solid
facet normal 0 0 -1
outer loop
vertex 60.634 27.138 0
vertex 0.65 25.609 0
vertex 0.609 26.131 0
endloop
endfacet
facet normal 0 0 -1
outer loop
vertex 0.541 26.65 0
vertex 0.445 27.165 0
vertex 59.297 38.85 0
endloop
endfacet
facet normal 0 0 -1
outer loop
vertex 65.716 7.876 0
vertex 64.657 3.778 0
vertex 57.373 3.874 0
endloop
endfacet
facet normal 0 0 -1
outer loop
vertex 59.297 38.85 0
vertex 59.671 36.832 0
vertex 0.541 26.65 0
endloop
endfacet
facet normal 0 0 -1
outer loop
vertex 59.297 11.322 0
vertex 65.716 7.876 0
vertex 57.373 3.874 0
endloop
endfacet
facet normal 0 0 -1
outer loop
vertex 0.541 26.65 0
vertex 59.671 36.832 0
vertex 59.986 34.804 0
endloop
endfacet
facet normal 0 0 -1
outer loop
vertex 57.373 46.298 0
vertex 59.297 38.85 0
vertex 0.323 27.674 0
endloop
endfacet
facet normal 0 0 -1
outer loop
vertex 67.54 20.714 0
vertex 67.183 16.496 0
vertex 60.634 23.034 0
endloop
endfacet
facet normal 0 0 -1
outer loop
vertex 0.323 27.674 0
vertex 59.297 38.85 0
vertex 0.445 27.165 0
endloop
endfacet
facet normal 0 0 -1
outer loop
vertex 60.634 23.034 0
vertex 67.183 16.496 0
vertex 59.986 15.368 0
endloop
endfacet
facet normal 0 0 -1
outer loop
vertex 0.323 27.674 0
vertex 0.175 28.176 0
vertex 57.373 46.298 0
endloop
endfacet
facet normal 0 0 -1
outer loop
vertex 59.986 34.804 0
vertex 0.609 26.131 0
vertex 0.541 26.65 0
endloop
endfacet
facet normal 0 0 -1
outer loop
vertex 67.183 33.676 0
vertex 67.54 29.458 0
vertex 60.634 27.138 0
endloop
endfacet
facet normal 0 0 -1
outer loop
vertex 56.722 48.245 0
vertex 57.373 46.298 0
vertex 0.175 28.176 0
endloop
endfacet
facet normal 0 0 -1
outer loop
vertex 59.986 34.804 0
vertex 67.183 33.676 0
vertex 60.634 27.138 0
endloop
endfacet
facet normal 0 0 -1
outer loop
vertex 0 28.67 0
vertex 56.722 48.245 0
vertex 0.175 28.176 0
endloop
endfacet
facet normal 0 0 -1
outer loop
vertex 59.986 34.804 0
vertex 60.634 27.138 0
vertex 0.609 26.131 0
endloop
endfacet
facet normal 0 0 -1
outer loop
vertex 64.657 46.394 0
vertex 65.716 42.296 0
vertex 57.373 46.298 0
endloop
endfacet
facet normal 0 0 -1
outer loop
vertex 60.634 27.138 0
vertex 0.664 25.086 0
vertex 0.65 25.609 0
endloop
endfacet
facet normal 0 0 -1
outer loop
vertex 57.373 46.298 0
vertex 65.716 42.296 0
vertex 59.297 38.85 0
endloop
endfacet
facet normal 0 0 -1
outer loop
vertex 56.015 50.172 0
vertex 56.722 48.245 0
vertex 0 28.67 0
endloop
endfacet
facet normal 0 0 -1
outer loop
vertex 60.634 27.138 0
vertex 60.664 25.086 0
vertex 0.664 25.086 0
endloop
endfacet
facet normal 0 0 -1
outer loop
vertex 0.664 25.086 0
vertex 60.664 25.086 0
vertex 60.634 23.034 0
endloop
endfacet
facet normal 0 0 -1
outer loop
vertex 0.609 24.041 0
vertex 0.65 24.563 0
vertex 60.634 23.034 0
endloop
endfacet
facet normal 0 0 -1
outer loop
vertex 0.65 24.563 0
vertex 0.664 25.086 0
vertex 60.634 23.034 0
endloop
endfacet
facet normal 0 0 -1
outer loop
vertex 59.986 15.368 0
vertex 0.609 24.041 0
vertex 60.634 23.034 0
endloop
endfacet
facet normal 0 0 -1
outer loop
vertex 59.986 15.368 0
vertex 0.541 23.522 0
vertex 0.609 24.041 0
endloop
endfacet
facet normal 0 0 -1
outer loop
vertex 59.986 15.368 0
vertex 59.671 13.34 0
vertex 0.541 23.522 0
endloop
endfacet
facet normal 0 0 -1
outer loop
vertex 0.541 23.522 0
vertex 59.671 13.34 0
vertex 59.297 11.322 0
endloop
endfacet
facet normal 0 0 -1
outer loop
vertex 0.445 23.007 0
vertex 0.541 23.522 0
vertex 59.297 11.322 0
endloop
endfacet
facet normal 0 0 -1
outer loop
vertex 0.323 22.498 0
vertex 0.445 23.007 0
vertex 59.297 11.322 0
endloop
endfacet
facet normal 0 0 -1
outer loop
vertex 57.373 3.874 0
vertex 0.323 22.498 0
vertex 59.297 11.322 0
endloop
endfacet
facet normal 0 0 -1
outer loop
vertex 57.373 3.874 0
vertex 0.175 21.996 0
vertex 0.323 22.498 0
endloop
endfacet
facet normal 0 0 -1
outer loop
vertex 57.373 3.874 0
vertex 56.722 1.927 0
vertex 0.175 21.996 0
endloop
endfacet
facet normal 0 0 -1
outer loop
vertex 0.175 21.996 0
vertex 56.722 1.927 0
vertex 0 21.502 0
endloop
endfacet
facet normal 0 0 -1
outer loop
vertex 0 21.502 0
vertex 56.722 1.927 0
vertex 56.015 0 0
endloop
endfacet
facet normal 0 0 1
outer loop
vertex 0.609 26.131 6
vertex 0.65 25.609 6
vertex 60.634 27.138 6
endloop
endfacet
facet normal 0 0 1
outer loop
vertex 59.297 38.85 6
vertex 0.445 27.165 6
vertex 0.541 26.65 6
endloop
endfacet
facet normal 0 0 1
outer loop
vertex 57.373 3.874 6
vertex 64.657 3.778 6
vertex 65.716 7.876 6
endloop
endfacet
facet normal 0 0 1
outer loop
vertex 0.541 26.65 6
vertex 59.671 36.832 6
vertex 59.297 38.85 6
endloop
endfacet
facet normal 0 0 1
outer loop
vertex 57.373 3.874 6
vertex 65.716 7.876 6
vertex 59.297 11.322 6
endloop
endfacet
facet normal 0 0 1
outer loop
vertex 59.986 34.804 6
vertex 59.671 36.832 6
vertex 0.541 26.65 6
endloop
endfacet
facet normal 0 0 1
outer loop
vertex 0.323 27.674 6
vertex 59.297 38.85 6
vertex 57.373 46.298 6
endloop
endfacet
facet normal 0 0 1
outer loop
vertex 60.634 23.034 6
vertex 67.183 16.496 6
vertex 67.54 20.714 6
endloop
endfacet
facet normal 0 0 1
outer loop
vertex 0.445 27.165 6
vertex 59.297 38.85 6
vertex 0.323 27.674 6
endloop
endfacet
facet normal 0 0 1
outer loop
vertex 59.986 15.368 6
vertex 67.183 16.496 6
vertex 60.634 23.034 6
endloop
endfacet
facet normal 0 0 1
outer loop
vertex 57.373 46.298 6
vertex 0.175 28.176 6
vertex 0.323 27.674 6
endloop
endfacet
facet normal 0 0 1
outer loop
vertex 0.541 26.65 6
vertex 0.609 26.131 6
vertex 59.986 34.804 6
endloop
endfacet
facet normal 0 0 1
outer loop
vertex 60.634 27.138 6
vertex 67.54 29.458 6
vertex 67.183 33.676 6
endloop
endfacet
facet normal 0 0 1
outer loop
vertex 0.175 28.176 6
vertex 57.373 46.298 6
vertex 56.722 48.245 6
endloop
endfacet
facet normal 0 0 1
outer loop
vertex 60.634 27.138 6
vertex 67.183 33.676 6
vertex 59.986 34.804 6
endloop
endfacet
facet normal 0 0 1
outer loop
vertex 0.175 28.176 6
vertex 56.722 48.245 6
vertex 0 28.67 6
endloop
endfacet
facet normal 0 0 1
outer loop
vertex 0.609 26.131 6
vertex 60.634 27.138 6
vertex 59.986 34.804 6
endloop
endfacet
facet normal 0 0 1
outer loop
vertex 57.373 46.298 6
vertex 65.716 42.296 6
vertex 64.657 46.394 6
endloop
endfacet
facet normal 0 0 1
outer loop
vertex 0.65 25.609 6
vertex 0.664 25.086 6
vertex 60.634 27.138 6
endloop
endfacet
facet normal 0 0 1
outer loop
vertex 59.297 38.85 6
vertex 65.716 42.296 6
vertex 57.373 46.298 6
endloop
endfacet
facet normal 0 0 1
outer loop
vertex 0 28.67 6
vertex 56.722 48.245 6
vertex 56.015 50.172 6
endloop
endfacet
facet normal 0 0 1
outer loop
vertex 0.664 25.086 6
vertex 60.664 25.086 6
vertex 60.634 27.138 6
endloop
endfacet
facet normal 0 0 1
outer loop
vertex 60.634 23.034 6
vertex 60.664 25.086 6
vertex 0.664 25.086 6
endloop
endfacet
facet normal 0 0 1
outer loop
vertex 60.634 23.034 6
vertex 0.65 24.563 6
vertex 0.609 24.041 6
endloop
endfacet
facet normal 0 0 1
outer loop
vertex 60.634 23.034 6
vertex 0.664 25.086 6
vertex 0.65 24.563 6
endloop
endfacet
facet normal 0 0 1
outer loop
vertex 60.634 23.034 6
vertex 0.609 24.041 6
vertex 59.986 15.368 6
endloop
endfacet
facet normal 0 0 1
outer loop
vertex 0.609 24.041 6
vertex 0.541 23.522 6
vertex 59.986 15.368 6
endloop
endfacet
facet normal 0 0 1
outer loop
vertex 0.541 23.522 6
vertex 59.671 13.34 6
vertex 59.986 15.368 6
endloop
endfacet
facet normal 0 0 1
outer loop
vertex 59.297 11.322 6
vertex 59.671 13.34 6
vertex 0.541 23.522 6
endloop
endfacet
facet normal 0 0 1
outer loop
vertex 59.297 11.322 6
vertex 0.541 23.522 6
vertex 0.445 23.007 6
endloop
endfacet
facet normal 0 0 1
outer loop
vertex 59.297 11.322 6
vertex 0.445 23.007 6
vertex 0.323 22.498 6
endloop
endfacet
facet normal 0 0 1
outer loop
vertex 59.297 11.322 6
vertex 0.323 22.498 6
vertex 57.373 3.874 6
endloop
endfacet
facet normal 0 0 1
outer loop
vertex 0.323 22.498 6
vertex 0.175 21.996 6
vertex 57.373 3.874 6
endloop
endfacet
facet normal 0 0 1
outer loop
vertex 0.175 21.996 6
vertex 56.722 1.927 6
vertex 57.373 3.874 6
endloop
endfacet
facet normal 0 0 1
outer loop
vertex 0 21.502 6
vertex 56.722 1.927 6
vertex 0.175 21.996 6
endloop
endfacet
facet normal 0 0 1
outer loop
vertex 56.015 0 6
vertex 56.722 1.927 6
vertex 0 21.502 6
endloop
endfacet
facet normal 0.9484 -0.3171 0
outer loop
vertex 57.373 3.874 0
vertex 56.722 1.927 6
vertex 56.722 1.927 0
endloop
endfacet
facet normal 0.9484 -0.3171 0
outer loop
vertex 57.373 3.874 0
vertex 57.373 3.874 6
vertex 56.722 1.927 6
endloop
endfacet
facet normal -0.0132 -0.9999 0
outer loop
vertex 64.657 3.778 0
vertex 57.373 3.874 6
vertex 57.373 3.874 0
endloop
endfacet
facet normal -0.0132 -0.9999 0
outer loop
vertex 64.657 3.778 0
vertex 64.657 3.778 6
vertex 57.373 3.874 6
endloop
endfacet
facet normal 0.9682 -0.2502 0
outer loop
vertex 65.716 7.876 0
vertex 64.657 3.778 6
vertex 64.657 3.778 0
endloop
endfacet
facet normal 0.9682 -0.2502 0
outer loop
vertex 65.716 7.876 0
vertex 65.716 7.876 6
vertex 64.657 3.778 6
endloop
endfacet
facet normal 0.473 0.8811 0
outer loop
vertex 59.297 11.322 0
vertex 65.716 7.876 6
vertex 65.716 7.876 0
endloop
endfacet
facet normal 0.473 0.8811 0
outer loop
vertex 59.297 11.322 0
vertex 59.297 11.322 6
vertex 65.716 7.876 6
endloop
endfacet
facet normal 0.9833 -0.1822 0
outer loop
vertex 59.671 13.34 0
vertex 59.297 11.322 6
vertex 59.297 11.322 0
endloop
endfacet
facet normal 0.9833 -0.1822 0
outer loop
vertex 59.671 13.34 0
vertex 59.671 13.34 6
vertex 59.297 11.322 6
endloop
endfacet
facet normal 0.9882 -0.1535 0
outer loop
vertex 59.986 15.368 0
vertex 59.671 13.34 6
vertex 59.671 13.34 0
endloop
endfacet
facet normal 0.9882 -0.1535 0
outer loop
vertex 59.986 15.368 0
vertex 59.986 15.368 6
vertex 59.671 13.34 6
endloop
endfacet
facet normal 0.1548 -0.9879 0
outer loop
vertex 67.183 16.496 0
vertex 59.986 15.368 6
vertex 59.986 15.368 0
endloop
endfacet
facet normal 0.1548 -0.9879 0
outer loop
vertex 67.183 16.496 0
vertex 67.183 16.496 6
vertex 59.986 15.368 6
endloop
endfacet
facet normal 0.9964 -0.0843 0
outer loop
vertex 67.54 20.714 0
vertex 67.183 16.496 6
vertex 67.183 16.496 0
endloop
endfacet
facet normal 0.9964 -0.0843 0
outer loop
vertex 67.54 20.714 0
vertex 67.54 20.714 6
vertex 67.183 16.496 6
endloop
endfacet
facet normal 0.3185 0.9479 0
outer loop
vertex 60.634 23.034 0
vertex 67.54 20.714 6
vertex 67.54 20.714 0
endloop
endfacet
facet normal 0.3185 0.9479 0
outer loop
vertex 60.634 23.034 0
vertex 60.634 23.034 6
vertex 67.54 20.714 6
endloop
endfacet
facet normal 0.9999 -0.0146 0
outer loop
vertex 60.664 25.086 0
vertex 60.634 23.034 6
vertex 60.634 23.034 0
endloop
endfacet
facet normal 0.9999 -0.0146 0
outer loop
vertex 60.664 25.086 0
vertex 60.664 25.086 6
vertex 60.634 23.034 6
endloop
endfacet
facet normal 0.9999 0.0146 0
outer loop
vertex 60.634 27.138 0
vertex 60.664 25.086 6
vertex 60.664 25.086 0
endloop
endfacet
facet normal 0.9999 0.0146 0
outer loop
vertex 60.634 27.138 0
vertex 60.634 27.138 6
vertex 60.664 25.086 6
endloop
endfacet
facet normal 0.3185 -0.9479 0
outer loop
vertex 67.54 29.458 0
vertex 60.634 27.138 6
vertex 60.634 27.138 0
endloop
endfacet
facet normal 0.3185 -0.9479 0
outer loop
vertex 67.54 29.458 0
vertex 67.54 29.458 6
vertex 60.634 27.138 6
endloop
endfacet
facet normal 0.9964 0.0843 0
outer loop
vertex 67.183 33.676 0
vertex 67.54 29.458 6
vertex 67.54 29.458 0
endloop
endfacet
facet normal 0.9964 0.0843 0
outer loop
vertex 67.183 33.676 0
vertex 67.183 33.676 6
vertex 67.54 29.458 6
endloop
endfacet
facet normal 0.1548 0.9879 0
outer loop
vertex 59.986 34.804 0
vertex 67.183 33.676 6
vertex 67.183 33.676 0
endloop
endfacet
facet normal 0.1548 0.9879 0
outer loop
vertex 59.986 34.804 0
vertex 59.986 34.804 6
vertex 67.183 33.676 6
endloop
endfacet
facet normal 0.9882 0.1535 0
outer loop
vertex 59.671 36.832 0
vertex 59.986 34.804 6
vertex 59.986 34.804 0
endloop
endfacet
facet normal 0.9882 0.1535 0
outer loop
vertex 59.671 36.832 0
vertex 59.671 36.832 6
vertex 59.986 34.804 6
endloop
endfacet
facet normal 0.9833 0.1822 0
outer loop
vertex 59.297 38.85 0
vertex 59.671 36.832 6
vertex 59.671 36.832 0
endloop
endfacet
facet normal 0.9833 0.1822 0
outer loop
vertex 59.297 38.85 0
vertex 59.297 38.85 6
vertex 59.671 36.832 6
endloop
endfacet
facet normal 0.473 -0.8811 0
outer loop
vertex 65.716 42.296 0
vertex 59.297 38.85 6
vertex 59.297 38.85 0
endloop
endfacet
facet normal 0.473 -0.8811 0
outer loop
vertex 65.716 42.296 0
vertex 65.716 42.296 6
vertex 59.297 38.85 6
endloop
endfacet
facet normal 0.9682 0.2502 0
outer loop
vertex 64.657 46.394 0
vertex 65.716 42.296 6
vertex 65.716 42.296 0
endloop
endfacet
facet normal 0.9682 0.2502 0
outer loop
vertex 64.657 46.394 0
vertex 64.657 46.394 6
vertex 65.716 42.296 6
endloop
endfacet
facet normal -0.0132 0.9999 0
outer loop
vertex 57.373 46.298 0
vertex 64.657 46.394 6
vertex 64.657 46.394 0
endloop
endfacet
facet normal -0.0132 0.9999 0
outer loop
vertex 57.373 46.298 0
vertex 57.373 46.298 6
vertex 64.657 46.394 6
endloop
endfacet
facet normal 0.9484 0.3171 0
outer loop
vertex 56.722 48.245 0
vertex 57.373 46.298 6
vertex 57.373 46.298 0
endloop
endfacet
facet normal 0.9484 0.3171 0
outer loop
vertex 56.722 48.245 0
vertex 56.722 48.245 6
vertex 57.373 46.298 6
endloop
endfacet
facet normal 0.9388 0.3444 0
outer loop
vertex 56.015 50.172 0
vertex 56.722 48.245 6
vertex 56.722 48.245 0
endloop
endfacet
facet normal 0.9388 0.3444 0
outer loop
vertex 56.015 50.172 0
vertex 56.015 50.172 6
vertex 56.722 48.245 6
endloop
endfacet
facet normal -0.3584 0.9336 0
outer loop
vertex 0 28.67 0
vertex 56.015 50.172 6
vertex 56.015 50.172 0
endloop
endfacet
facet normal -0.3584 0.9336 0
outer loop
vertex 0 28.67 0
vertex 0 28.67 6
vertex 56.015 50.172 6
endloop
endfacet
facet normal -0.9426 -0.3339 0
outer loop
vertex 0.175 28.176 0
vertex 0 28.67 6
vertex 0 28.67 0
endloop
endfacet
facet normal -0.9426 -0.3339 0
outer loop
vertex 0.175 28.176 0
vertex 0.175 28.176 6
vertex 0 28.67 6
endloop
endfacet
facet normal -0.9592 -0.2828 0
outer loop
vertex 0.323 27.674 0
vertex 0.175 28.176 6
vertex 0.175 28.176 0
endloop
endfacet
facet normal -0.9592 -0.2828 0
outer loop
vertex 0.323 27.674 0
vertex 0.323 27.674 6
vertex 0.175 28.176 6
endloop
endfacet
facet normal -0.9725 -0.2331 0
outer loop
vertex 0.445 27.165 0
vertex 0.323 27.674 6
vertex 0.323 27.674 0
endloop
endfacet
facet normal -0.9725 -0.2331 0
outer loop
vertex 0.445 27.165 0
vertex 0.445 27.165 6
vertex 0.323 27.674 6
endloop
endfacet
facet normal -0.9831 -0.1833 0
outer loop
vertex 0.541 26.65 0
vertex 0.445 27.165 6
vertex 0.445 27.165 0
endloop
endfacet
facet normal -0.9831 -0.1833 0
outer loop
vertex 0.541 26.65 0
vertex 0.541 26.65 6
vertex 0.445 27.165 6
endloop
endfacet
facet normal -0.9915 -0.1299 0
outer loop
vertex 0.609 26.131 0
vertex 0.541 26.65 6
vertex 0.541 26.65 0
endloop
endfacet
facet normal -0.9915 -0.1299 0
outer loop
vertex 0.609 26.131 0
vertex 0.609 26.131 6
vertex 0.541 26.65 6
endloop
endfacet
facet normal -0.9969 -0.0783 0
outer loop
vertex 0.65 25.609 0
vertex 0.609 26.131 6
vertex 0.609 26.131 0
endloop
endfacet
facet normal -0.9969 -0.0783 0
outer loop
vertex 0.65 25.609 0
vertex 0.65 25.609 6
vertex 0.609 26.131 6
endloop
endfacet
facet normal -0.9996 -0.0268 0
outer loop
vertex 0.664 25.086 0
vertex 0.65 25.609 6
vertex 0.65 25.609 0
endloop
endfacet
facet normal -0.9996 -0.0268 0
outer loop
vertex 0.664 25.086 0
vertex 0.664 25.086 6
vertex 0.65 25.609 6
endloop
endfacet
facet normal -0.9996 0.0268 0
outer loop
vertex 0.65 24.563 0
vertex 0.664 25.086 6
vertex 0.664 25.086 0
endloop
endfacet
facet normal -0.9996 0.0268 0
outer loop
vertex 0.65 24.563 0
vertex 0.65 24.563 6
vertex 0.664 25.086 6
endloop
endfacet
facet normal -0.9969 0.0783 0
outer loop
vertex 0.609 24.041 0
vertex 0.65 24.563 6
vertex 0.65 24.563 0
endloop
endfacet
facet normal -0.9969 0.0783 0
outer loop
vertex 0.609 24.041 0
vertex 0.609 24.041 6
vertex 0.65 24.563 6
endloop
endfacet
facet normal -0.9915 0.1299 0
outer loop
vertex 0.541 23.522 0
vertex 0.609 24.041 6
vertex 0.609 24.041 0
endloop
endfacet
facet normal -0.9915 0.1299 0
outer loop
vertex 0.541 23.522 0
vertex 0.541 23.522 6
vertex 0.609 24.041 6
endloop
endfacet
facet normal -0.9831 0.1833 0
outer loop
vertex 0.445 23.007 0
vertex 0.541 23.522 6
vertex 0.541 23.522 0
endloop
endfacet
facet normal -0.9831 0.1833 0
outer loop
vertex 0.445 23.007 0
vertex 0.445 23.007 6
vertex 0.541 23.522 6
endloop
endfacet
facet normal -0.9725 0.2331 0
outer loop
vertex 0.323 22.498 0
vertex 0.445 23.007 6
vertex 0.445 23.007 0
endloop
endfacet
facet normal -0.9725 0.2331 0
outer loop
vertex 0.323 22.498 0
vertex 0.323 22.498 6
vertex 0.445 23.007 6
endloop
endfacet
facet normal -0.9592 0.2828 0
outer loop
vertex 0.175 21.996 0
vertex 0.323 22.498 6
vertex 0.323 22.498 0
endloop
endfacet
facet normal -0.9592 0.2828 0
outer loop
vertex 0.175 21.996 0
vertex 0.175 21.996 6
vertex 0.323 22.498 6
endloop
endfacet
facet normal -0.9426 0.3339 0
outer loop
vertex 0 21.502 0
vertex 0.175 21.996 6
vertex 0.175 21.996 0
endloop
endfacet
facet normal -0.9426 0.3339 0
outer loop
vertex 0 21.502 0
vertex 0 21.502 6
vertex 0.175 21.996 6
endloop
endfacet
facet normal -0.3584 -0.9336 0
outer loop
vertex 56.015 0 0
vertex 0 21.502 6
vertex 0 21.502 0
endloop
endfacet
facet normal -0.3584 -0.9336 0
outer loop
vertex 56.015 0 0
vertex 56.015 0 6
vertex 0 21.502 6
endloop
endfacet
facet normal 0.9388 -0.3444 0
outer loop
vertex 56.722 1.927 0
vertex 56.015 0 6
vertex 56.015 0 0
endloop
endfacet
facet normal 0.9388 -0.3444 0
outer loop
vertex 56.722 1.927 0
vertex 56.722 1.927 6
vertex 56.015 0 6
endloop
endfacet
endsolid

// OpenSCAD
$fn = 32;

// ----------------------------------------------------------------------
// Gear sector: 4 teeth on 42 degrees
// ----------------------------------------------------------------------

// --- parameters (mm) ---
sector_angle = 42;        // sector angle, degrees
root_r = 70;              // root circle radius
tooth_h = 7;              // tooth height over the root circle
teeth = 4;                // number of teeth on the sector
hub_r = 10;               // hub bore radius
plate_t = 6;              // sector thickness, Z
arc_step = 3;             // sampling step of the root/hub arcs, degrees

tip_r = root_r + tooth_h;  // tip circle radius

profile = [[56.015, 0], [56.722, 1.927], [57.373, 3.874], [64.657, 3.778], [65.716, 7.876], [59.297, 11.322], [59.671, 13.34], [59.986, 15.368], [67.183, 16.496], [67.54, 20.714], [60.634, 23.034], [60.664, 25.086], [60.634, 27.138], [67.54, 29.458], [67.183, 33.676], [59.986, 34.804], [59.671, 36.832], [59.297, 38.85], [65.716, 42.296], [64.657, 46.394], [57.373, 46.298], [56.722, 48.245], [56.015, 50.172], [0, 28.67], [0.175, 28.176], [0.323, 27.674], [0.445, 27.165], [0.541, 26.65], [0.609, 26.131], [0.65, 25.609], [0.664, 25.086], [0.65, 24.563], [0.609, 24.041], [0.541, 23.522], [0.445, 23.007], [0.323, 22.498], [0.175, 21.996], [0, 21.502]];  // primary outline, 38 points, counter clockwise

// --- the one profile operation ---
linear_extrude(height = plate_t) polygon(points = profile);
